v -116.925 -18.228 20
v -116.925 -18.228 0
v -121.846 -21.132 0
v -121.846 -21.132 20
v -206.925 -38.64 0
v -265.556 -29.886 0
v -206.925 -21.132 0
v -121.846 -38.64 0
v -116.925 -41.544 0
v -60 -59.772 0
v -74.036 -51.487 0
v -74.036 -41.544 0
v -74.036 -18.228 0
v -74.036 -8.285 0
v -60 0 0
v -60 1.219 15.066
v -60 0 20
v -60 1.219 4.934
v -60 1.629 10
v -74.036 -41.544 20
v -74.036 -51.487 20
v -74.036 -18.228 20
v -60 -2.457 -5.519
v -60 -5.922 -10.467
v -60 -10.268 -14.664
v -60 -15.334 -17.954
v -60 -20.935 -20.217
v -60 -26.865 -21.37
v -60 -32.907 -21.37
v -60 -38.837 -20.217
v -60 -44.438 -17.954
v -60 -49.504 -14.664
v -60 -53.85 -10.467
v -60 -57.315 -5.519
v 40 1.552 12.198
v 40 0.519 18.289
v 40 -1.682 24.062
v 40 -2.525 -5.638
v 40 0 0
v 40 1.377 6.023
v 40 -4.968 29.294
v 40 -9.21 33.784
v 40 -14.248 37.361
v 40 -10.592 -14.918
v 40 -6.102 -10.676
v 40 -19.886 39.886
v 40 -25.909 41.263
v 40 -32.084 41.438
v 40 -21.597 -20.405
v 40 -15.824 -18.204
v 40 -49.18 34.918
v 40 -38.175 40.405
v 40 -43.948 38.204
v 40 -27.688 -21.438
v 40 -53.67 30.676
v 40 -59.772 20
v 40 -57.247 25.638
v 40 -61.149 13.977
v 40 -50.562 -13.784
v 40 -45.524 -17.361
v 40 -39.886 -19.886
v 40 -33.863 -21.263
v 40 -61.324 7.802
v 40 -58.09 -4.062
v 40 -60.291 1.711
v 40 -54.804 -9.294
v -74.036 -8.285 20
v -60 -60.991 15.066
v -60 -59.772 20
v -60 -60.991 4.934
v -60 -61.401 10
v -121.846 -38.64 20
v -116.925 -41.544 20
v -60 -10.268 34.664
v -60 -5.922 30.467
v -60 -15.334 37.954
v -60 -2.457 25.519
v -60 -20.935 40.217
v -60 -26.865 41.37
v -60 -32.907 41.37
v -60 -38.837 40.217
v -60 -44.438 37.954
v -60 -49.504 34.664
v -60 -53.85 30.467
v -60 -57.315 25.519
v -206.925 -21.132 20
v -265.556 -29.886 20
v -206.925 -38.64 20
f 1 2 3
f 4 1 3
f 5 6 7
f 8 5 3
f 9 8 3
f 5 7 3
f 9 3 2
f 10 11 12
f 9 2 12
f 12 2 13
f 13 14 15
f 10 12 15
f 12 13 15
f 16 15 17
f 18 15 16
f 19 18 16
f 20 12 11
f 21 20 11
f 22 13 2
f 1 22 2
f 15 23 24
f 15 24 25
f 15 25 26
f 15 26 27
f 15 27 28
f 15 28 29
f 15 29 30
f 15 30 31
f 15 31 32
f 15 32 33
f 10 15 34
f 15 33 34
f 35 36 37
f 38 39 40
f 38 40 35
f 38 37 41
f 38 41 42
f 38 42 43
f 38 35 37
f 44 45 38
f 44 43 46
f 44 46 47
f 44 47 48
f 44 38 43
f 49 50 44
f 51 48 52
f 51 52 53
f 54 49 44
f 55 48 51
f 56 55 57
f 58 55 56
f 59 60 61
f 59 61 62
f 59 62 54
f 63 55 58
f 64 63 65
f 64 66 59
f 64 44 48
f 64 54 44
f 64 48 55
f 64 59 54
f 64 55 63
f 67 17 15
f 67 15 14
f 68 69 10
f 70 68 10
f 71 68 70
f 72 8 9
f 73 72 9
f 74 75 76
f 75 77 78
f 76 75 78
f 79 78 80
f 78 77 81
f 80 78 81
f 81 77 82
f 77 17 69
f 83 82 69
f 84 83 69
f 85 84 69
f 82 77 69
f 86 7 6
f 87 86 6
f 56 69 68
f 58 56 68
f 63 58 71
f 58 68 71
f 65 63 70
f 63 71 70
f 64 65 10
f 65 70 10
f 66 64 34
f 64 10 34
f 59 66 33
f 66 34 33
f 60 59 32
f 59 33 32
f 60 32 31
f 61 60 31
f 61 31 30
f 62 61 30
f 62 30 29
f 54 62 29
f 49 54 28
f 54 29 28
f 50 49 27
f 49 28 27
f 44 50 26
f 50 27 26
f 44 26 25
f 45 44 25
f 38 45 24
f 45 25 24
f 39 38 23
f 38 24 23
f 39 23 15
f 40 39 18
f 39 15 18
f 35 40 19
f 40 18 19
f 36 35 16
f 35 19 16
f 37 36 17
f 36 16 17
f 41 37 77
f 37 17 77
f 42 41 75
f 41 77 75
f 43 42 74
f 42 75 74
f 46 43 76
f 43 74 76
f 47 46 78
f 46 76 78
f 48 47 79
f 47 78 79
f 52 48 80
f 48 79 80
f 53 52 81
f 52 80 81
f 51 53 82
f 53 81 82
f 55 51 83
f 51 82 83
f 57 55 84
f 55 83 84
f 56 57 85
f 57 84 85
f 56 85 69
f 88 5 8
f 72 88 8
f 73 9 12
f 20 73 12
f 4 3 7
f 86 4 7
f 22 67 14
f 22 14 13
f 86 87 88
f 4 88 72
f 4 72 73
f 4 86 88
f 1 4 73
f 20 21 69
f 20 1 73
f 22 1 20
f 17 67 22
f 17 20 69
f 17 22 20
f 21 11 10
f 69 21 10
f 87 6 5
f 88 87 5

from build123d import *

# Parameters (mm, degrees)
BOSS_EXTRUDE7_DEPTH = 20
SKETCH12_R          = 31.514643475
BOSS_EXTRUDE8_DEPTH = 100


with BuildPart() as part:
    # Sketch1 → Boss-Extrude7 (new body)
    with BuildSketch(Plane.XY):
        Polygon((-74.036406968, -41.544157833), (-74.036406968, -29.88599594), (-265.556443783, -29.88599594), (-206.925428257, -38.639637749), (-121.846026988, -38.639637749), (-116.925428257, -41.544157833), align=None)
        Polygon((-74.036406968, -29.88599594), (-74.036406968, -18.227834048), (-116.925428257, -18.227834048), (-121.846026988, -21.132354132), (-206.925428257, -21.132354132), (-265.556443783, -29.88599594), align=None)
        Polygon((-60, -59.771991881), (-60, -29.88599594), (-74.036406968, -29.88599594), (-74.036406968, -41.544157833), (-74.036406968, -51.486612768), align=None)
        Polygon((-60, -29.88599594), (-60, 0), (-74.036406968, -8.285379113), (-74.036406968, -18.227834048), (-74.036406968, -29.88599594), align=None)
    extrude(amount=BOSS_EXTRUDE7_DEPTH)

    # Sketch12 → Boss-Extrude8 (add)
    with BuildSketch(Plane(origin=(-60, 0, 0), x_dir=(0, 0, -1), z_dir=(1, 0, 0))):
        with Locations(Location((-10, -29.88599594, 0), (0, 0, 251.499507524))):
            Circle(SKETCH12_R)
    extrude(amount=BOSS_EXTRUDE8_DEPTH)


solid = part.part
